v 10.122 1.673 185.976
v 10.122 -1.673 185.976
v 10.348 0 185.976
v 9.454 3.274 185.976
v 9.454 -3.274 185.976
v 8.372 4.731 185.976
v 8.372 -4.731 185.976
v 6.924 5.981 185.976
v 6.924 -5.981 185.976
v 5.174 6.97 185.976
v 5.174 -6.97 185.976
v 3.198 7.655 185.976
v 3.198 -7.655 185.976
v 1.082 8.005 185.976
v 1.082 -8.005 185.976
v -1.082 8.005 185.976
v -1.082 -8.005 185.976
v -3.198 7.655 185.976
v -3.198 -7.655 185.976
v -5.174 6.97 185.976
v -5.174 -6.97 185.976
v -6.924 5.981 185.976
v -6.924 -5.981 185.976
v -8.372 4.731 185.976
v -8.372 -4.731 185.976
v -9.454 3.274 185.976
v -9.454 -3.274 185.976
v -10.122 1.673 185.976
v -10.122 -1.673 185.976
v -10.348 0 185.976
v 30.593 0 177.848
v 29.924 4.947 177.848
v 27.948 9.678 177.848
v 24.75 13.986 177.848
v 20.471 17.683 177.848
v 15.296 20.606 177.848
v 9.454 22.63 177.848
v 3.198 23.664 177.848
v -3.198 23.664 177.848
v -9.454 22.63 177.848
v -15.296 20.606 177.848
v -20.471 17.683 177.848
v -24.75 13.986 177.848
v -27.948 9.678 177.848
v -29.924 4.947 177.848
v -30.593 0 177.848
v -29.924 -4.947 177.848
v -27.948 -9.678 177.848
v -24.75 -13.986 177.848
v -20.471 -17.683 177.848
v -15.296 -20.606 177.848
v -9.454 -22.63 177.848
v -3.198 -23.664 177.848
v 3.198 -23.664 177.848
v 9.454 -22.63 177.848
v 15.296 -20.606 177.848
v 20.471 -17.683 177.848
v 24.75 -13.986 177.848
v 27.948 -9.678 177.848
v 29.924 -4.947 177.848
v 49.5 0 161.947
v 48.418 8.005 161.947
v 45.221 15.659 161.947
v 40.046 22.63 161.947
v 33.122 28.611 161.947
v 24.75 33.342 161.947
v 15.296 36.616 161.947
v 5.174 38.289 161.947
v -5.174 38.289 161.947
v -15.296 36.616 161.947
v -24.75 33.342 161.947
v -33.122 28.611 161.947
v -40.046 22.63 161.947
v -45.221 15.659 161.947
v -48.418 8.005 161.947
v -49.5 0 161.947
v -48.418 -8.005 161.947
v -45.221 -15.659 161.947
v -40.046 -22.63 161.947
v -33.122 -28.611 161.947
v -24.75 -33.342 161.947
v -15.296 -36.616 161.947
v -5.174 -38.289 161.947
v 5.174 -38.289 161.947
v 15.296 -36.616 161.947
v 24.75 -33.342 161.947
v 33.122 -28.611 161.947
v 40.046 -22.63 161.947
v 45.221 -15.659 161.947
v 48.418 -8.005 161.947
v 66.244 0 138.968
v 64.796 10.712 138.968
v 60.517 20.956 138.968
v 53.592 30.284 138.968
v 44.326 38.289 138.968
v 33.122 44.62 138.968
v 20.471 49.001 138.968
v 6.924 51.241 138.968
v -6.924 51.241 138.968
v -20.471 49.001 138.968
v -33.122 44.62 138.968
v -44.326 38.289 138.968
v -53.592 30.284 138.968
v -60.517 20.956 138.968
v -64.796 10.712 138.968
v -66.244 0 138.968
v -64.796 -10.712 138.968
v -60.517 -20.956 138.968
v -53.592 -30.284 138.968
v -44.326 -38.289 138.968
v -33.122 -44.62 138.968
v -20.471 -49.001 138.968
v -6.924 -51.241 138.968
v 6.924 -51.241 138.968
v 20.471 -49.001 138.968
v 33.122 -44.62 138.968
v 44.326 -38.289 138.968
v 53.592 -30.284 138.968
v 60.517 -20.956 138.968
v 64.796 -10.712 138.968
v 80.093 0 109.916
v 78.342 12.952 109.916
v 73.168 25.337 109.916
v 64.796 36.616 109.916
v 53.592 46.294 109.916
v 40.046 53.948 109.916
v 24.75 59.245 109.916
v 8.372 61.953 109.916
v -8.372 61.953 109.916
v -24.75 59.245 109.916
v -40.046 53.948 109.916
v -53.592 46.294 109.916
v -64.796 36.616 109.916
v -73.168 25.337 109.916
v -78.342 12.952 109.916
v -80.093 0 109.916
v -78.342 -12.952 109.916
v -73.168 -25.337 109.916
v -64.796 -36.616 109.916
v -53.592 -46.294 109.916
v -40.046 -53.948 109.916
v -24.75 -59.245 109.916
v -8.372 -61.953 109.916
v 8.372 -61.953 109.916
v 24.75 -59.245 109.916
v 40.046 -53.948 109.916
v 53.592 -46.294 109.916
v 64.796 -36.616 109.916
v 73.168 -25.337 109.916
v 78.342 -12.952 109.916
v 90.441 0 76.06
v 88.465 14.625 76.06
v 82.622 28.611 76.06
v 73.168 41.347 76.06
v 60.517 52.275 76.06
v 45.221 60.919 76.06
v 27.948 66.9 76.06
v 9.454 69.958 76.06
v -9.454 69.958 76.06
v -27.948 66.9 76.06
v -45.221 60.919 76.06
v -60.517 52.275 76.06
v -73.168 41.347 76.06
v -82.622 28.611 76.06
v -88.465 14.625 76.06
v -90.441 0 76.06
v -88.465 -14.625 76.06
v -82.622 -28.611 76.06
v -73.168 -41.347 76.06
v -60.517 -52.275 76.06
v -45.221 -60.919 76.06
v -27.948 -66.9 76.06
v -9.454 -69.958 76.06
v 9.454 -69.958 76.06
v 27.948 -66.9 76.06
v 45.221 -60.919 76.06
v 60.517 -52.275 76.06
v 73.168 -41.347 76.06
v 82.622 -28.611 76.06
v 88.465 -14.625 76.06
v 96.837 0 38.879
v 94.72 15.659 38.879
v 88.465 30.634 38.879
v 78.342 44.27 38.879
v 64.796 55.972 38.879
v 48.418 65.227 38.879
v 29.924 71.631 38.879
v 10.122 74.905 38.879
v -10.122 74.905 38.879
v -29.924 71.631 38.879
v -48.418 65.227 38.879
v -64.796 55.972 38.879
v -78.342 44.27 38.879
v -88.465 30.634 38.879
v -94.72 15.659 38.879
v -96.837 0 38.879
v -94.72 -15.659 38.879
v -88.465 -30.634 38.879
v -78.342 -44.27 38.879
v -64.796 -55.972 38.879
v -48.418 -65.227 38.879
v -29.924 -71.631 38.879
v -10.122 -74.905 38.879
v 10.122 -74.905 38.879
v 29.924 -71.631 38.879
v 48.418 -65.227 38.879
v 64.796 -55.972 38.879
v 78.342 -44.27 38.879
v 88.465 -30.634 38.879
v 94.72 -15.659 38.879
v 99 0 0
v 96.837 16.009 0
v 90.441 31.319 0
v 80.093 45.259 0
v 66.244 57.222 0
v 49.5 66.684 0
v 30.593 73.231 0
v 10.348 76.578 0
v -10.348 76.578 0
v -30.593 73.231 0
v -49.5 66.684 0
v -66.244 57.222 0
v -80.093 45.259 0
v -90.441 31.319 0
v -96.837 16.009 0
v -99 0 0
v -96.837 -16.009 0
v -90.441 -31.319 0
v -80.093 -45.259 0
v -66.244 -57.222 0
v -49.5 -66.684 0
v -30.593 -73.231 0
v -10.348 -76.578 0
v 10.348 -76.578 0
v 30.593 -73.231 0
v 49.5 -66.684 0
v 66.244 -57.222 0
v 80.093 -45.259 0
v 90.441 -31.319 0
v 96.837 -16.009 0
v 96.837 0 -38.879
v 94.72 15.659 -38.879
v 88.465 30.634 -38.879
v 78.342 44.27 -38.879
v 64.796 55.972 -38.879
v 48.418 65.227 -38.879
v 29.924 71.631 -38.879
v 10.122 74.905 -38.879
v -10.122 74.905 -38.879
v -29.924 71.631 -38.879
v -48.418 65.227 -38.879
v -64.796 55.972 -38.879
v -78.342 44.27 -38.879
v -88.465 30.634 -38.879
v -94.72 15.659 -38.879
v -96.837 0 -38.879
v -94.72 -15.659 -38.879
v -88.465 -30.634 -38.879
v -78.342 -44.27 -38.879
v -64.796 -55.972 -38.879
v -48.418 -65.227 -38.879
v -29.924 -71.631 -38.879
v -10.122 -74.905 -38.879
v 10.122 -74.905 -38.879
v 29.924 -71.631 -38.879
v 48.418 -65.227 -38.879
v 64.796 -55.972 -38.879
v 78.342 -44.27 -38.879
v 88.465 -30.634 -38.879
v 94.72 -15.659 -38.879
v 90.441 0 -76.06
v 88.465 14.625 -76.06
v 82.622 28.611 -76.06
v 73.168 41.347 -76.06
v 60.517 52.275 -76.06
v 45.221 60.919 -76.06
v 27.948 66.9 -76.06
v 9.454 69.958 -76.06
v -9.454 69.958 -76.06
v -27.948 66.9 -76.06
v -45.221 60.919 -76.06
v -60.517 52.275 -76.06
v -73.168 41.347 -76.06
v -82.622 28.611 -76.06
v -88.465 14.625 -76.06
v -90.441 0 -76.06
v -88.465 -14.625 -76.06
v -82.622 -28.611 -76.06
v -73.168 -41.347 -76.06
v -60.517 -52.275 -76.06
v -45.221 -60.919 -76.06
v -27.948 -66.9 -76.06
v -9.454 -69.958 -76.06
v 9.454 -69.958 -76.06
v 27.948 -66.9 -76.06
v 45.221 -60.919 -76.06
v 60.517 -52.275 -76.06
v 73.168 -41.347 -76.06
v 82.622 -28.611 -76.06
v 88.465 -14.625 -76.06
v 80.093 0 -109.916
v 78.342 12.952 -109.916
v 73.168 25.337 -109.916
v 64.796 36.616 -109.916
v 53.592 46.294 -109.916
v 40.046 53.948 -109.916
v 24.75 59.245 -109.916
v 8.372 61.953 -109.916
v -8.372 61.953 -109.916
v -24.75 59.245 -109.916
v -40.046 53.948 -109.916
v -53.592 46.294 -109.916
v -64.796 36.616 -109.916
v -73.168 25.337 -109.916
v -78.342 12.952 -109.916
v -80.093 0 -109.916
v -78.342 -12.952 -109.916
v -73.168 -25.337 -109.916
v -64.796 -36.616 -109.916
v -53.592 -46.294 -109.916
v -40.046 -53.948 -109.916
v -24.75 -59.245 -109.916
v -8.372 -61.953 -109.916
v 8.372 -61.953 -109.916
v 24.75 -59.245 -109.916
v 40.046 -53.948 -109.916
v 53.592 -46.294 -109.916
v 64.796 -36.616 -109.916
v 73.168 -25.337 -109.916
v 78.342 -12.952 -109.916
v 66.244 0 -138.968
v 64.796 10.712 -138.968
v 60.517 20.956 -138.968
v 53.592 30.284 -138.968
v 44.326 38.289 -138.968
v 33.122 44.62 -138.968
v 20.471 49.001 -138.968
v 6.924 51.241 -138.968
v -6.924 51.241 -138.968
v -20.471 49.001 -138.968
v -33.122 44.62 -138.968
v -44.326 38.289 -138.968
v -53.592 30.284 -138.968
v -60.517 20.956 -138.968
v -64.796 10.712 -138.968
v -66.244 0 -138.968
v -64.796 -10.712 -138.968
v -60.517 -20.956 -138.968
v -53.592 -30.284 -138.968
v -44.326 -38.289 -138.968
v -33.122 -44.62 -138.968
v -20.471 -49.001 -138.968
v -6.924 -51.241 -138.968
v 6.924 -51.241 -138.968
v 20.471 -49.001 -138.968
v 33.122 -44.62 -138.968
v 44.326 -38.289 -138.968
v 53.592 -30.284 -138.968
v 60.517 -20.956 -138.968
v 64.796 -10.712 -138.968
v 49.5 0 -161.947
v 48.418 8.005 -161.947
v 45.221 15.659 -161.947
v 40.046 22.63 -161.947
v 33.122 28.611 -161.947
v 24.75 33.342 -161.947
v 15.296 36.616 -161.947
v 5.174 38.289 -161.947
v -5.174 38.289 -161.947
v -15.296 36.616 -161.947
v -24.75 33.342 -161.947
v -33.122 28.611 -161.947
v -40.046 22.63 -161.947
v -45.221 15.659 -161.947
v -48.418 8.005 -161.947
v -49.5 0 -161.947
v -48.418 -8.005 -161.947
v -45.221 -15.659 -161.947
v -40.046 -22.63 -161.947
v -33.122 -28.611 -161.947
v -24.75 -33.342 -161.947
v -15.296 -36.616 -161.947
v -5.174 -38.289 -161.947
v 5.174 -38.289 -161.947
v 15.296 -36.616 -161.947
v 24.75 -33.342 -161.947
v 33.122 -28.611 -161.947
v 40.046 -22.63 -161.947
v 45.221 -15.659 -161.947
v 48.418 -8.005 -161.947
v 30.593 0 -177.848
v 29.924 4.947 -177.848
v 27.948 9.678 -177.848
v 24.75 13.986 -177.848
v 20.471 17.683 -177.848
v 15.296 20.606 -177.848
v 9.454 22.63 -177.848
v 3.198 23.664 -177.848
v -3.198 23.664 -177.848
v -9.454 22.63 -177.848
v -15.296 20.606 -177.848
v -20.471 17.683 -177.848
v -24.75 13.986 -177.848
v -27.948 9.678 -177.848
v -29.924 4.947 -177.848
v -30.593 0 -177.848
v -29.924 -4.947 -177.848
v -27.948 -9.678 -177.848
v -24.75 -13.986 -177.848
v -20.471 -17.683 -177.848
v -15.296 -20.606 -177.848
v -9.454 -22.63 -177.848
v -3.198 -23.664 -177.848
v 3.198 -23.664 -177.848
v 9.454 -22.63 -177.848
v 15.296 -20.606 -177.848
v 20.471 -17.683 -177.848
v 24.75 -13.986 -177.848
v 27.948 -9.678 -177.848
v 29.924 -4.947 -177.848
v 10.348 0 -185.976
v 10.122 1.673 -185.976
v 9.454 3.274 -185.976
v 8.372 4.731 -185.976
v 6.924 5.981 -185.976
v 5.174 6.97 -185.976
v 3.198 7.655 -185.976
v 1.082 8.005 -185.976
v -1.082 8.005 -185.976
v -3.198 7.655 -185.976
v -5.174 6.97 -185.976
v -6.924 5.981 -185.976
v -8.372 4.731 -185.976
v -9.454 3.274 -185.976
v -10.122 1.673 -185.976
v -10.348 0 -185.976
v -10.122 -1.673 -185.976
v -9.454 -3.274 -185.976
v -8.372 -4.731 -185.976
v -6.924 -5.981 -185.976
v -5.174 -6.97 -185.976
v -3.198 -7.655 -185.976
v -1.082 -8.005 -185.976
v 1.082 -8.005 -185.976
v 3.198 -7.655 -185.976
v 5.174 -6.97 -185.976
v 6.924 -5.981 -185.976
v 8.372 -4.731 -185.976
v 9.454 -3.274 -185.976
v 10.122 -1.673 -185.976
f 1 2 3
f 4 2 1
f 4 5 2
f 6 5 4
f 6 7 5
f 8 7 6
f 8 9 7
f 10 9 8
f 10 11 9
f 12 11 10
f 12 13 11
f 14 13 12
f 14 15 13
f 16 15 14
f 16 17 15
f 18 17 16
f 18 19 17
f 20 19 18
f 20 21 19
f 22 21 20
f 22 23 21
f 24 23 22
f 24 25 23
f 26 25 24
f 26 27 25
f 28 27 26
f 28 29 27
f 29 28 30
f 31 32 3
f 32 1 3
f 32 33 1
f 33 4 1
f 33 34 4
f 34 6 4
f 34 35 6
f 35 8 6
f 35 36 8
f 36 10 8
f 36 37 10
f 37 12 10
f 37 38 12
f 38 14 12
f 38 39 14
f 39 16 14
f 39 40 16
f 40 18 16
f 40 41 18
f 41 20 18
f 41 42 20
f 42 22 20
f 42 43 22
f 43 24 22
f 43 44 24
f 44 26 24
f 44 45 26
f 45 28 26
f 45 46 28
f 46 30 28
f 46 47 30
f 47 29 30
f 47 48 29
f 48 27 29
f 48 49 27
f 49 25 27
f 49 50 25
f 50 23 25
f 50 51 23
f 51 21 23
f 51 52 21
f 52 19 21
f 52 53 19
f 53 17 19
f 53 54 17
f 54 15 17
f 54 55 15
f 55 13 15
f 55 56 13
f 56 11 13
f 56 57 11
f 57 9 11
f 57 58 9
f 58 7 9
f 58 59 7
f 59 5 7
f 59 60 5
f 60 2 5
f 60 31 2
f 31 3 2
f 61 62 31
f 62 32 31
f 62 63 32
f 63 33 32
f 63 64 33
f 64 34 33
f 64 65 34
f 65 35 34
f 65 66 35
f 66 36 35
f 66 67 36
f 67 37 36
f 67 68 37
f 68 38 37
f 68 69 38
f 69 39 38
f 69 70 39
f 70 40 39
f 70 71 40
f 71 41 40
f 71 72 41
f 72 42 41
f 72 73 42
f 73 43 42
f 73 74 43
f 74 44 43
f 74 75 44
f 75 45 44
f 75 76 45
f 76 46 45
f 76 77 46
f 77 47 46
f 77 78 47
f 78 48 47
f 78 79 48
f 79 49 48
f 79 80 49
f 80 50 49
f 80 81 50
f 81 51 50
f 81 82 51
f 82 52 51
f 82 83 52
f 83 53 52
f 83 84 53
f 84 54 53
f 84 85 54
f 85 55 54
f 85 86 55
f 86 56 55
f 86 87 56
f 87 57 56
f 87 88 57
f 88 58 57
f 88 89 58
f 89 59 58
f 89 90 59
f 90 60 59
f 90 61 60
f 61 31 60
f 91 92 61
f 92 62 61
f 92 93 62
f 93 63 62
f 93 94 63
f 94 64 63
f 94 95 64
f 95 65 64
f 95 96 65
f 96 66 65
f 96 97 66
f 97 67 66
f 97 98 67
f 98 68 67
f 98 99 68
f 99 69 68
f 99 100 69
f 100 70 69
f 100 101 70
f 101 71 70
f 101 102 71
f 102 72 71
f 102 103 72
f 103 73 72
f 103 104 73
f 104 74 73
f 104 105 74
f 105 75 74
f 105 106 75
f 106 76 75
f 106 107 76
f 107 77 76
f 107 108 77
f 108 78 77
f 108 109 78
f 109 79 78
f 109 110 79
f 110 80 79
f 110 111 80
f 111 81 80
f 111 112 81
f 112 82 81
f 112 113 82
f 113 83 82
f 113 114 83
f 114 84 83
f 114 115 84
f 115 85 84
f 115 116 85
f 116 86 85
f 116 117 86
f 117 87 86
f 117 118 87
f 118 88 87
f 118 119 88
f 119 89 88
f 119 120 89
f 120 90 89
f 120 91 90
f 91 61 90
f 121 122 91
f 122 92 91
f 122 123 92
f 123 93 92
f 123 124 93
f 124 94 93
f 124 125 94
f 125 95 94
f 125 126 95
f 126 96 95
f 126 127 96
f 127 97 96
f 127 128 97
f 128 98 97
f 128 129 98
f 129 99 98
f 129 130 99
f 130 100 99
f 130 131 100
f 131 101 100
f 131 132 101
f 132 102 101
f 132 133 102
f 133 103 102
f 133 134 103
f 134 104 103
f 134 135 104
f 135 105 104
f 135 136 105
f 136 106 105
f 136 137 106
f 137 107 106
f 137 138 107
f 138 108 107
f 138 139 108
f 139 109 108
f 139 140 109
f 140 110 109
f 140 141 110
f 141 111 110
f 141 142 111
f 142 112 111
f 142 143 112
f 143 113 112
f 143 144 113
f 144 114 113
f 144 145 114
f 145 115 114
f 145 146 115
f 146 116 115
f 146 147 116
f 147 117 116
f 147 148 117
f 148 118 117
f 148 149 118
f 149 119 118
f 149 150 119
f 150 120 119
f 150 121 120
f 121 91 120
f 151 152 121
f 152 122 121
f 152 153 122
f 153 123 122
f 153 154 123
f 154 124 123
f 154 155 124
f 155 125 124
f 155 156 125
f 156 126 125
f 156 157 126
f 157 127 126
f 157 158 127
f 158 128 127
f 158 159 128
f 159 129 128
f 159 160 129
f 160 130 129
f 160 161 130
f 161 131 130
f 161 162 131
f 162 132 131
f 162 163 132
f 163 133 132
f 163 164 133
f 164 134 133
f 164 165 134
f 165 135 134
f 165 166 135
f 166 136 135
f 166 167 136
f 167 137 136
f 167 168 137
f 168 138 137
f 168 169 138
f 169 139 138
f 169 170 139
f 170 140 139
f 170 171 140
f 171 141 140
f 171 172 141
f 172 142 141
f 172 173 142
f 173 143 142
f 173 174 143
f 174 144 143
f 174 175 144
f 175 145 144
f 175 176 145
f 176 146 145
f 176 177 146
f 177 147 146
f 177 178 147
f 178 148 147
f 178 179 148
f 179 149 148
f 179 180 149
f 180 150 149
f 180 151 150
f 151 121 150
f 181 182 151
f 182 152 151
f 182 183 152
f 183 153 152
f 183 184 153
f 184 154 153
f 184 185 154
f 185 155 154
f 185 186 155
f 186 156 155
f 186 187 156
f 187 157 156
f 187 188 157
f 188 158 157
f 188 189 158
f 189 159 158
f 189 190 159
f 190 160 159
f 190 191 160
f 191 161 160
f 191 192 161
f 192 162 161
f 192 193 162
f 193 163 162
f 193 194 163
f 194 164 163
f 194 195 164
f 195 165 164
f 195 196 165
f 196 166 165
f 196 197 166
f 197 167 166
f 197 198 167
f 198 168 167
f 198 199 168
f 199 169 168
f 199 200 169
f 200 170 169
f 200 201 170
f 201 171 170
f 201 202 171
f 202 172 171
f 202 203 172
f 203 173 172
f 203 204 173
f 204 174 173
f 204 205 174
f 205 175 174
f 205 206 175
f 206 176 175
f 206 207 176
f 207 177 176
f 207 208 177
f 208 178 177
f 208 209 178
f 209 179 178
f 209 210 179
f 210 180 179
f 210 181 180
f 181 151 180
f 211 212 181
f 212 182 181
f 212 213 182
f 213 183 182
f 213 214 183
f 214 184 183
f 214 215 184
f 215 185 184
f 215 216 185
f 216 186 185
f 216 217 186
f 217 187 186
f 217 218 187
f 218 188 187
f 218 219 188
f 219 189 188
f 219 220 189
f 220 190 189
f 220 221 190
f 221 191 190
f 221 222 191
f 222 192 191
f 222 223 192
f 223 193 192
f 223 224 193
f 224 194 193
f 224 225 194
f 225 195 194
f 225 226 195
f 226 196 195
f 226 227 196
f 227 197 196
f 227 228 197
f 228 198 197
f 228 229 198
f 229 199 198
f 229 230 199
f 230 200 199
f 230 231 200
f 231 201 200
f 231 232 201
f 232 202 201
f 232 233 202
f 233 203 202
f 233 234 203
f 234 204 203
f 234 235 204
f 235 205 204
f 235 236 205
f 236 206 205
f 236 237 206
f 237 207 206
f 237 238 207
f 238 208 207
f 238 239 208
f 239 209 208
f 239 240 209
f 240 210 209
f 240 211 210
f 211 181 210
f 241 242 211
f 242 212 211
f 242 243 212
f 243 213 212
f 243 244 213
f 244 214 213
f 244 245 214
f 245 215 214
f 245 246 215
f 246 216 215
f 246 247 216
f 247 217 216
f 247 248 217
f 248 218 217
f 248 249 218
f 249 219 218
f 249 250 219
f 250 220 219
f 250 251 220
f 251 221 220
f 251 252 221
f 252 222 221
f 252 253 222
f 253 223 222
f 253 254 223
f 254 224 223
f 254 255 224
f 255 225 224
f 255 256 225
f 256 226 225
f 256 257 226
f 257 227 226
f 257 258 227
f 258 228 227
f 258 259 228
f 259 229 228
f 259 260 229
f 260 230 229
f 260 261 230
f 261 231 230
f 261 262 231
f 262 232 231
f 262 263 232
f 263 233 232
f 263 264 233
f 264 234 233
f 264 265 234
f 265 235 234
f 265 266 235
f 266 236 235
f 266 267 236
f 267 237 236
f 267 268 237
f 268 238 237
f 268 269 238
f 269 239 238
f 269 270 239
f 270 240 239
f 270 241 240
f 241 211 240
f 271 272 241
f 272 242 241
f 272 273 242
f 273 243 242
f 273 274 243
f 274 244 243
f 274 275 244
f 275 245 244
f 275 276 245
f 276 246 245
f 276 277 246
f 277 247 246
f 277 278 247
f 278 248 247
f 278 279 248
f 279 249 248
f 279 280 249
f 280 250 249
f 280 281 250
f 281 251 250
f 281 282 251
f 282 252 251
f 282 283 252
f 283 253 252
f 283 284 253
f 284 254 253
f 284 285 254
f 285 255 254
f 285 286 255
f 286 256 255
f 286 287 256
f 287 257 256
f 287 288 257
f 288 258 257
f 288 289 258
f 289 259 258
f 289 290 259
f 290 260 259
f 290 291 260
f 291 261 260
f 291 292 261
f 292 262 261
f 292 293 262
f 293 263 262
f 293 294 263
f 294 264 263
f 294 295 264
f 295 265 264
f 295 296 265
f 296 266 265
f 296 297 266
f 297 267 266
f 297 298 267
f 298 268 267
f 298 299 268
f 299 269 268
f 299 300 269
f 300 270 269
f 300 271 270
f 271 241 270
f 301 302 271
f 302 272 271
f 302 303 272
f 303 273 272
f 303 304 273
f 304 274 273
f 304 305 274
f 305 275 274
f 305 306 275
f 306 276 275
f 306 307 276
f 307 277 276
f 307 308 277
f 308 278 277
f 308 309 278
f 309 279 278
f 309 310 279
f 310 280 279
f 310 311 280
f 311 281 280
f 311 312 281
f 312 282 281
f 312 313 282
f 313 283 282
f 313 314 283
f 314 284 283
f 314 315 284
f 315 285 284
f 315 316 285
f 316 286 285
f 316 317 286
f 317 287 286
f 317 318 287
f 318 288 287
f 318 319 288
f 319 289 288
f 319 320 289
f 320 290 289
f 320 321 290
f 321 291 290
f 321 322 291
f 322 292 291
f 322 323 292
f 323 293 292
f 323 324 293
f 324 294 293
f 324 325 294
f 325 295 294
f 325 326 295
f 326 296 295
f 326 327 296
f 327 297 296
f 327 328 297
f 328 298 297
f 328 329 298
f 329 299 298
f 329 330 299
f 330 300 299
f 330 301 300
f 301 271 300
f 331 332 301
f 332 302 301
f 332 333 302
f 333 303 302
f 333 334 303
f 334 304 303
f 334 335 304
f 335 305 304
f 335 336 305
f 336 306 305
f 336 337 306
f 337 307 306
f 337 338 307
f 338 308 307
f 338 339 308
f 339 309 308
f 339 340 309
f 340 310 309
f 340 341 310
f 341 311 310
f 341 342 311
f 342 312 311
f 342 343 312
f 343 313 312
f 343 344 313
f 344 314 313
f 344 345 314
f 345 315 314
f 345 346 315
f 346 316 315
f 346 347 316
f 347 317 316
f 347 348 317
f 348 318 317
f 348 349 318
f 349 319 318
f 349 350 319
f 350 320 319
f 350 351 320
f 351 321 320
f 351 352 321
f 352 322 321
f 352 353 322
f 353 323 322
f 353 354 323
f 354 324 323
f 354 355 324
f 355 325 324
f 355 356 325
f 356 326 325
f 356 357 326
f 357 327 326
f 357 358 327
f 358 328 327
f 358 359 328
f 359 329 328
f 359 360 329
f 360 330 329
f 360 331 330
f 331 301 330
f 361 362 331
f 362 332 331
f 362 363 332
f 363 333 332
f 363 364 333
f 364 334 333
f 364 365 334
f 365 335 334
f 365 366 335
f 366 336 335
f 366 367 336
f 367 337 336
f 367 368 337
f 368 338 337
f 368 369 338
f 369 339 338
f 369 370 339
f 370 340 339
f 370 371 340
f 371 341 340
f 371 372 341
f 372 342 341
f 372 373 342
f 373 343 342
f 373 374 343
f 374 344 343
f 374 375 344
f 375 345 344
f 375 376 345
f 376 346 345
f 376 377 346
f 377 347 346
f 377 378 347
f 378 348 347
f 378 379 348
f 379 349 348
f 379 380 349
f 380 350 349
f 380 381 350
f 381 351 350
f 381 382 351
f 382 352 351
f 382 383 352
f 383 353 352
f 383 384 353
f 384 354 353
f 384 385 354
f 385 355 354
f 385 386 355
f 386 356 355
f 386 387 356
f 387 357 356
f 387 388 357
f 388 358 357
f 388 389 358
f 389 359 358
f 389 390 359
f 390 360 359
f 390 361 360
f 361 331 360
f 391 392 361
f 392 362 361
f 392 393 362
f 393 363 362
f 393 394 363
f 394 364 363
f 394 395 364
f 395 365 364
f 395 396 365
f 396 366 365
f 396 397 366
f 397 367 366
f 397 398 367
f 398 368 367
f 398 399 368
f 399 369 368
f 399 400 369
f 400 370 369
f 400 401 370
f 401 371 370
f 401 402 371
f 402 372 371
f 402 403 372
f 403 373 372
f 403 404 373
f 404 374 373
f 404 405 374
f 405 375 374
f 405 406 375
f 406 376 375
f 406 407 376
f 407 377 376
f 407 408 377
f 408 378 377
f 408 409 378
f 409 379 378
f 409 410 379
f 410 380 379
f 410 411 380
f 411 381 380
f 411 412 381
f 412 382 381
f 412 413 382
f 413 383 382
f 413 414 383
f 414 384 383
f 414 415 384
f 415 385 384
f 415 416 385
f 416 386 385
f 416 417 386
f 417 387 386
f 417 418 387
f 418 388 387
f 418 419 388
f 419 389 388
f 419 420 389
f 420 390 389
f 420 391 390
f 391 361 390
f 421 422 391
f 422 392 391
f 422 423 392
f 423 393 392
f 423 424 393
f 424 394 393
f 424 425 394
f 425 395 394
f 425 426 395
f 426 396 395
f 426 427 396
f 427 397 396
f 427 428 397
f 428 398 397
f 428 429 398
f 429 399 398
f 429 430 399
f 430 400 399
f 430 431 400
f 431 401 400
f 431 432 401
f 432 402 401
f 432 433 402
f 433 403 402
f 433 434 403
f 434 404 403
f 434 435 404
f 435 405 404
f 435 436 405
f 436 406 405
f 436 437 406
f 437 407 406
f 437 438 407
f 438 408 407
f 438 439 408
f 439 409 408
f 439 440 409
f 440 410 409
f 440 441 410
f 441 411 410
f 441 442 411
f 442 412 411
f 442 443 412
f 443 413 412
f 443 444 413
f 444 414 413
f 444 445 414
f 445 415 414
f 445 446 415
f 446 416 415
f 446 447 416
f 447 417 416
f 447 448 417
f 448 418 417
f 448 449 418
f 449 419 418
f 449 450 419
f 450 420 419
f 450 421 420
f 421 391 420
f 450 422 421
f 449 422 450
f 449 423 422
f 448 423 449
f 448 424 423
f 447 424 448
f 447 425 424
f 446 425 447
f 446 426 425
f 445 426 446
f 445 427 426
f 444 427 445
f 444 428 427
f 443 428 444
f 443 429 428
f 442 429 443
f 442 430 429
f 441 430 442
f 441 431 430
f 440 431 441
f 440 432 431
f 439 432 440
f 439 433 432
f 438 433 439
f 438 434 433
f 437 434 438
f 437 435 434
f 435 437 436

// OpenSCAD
// Generated by SolidPython 1.0.1 on 2020-07-29 00:46:48


scale(v = [9, 7, 17]) {
	sphere(r = 11);
}
/***********************************************
*********      SolidPython code:      **********
************************************************
 
# import packages: SolidPython
from solid import *
from solid.utils import *
from itertools import chain, combinations, permutations


class Resize:

    def __init__(self, scad_file):
        self.scad_file = scad_file
        #self.scad_file = import_scad(scad_file)
        # cone/cylinder param:
        self.r1 = 0
        self.r2 = 0
        self.h = 0
        # rectangular prism param:
        self.w = 0
        self.l = 0
        # ellipse param:
        self.r = 0

    # import OpenScad code (file name corresponds to shape)


    # classify shape + parameters
    def assign(self, param1, param2, param3):
        if self.scad_file == 'cone.scad':
            self.r1 = param1
            self.r2 = param2
            self.h = param3
        elif self.scad_file == 'cylinder.scad':
            self.r1 = param1
            self.r2 = param2
            self.h = param3
        elif self.scad_file == 'rectangularPrism.scad':
            self.h = param1
            self.l = param2
            self.w = param3
        else:
            self.r = param1
            self.h = param2

    # resize parameters
    def iterate(self):
        x = range(3, 20, 2)
        i = 1
        if self.scad_file == 'cone.scad':
            tempList = list(permutations(x, 2))
            for temp in tempList:
                param1 = temp[0]
                param2 = temp[1]
                filepath = 'produced_scad_files/' + 'cone' + str(param1) + '_' + str(param2) + '_' + '.scad'
                scad_render_to_file(cylinder(h=param1, r1=param2, r2=0), filepath)

        elif self.scad_file == 'cylinder.scad':
            tempList = list(permutations(x, 3))
            for temp in tempList:
                param1 = temp[0]
                param2 = temp[1]
                filepath = 'produced_scad_files/' + 'cylinder' + str(param1) + '_' + str(param2) + '_' + '.scad'
                scad_render_to_file(cylinder(h=param1, r1=param2, r2=param2), filepath)

        elif self.scad_file == 'rectangularPrism.scad':
            tempList = list(permutations(x, 3))
            for temp in tempList:
                param1 = temp[0]
                param2 = temp[1]
                param3 = temp[2]
                filepath = 'produced_scad_files/' + 'rectangularPrism' + str(param1) + '_' + str(param2) + '_' + str(
                    param3) + '.scad'
                scad_render_to_file(cube(size=(param1, param2, param3)), filepath)

        elif self.scad_file == 'ellipse.scad':
            tempList = list(permutations(x, 4))
            for temp in tempList:
                param1 = temp[0]
                param2 = temp[1]
                param3 = temp[2]
                param4 = temp[3]
                filepath = 'produced_scad_files/' + 'ellipse' + str(param1) + '_' + str(param2) + '_' + str(param3) + '_' + str(param4) + '.scad'
                scad_render_to_file(scale([param1, param2, param3])(sphere(r=param4)), filepath)

    def render_to_scadfile(self):
        scad_render_to_file(scad, 'example.scad') 
 
************************************************/
